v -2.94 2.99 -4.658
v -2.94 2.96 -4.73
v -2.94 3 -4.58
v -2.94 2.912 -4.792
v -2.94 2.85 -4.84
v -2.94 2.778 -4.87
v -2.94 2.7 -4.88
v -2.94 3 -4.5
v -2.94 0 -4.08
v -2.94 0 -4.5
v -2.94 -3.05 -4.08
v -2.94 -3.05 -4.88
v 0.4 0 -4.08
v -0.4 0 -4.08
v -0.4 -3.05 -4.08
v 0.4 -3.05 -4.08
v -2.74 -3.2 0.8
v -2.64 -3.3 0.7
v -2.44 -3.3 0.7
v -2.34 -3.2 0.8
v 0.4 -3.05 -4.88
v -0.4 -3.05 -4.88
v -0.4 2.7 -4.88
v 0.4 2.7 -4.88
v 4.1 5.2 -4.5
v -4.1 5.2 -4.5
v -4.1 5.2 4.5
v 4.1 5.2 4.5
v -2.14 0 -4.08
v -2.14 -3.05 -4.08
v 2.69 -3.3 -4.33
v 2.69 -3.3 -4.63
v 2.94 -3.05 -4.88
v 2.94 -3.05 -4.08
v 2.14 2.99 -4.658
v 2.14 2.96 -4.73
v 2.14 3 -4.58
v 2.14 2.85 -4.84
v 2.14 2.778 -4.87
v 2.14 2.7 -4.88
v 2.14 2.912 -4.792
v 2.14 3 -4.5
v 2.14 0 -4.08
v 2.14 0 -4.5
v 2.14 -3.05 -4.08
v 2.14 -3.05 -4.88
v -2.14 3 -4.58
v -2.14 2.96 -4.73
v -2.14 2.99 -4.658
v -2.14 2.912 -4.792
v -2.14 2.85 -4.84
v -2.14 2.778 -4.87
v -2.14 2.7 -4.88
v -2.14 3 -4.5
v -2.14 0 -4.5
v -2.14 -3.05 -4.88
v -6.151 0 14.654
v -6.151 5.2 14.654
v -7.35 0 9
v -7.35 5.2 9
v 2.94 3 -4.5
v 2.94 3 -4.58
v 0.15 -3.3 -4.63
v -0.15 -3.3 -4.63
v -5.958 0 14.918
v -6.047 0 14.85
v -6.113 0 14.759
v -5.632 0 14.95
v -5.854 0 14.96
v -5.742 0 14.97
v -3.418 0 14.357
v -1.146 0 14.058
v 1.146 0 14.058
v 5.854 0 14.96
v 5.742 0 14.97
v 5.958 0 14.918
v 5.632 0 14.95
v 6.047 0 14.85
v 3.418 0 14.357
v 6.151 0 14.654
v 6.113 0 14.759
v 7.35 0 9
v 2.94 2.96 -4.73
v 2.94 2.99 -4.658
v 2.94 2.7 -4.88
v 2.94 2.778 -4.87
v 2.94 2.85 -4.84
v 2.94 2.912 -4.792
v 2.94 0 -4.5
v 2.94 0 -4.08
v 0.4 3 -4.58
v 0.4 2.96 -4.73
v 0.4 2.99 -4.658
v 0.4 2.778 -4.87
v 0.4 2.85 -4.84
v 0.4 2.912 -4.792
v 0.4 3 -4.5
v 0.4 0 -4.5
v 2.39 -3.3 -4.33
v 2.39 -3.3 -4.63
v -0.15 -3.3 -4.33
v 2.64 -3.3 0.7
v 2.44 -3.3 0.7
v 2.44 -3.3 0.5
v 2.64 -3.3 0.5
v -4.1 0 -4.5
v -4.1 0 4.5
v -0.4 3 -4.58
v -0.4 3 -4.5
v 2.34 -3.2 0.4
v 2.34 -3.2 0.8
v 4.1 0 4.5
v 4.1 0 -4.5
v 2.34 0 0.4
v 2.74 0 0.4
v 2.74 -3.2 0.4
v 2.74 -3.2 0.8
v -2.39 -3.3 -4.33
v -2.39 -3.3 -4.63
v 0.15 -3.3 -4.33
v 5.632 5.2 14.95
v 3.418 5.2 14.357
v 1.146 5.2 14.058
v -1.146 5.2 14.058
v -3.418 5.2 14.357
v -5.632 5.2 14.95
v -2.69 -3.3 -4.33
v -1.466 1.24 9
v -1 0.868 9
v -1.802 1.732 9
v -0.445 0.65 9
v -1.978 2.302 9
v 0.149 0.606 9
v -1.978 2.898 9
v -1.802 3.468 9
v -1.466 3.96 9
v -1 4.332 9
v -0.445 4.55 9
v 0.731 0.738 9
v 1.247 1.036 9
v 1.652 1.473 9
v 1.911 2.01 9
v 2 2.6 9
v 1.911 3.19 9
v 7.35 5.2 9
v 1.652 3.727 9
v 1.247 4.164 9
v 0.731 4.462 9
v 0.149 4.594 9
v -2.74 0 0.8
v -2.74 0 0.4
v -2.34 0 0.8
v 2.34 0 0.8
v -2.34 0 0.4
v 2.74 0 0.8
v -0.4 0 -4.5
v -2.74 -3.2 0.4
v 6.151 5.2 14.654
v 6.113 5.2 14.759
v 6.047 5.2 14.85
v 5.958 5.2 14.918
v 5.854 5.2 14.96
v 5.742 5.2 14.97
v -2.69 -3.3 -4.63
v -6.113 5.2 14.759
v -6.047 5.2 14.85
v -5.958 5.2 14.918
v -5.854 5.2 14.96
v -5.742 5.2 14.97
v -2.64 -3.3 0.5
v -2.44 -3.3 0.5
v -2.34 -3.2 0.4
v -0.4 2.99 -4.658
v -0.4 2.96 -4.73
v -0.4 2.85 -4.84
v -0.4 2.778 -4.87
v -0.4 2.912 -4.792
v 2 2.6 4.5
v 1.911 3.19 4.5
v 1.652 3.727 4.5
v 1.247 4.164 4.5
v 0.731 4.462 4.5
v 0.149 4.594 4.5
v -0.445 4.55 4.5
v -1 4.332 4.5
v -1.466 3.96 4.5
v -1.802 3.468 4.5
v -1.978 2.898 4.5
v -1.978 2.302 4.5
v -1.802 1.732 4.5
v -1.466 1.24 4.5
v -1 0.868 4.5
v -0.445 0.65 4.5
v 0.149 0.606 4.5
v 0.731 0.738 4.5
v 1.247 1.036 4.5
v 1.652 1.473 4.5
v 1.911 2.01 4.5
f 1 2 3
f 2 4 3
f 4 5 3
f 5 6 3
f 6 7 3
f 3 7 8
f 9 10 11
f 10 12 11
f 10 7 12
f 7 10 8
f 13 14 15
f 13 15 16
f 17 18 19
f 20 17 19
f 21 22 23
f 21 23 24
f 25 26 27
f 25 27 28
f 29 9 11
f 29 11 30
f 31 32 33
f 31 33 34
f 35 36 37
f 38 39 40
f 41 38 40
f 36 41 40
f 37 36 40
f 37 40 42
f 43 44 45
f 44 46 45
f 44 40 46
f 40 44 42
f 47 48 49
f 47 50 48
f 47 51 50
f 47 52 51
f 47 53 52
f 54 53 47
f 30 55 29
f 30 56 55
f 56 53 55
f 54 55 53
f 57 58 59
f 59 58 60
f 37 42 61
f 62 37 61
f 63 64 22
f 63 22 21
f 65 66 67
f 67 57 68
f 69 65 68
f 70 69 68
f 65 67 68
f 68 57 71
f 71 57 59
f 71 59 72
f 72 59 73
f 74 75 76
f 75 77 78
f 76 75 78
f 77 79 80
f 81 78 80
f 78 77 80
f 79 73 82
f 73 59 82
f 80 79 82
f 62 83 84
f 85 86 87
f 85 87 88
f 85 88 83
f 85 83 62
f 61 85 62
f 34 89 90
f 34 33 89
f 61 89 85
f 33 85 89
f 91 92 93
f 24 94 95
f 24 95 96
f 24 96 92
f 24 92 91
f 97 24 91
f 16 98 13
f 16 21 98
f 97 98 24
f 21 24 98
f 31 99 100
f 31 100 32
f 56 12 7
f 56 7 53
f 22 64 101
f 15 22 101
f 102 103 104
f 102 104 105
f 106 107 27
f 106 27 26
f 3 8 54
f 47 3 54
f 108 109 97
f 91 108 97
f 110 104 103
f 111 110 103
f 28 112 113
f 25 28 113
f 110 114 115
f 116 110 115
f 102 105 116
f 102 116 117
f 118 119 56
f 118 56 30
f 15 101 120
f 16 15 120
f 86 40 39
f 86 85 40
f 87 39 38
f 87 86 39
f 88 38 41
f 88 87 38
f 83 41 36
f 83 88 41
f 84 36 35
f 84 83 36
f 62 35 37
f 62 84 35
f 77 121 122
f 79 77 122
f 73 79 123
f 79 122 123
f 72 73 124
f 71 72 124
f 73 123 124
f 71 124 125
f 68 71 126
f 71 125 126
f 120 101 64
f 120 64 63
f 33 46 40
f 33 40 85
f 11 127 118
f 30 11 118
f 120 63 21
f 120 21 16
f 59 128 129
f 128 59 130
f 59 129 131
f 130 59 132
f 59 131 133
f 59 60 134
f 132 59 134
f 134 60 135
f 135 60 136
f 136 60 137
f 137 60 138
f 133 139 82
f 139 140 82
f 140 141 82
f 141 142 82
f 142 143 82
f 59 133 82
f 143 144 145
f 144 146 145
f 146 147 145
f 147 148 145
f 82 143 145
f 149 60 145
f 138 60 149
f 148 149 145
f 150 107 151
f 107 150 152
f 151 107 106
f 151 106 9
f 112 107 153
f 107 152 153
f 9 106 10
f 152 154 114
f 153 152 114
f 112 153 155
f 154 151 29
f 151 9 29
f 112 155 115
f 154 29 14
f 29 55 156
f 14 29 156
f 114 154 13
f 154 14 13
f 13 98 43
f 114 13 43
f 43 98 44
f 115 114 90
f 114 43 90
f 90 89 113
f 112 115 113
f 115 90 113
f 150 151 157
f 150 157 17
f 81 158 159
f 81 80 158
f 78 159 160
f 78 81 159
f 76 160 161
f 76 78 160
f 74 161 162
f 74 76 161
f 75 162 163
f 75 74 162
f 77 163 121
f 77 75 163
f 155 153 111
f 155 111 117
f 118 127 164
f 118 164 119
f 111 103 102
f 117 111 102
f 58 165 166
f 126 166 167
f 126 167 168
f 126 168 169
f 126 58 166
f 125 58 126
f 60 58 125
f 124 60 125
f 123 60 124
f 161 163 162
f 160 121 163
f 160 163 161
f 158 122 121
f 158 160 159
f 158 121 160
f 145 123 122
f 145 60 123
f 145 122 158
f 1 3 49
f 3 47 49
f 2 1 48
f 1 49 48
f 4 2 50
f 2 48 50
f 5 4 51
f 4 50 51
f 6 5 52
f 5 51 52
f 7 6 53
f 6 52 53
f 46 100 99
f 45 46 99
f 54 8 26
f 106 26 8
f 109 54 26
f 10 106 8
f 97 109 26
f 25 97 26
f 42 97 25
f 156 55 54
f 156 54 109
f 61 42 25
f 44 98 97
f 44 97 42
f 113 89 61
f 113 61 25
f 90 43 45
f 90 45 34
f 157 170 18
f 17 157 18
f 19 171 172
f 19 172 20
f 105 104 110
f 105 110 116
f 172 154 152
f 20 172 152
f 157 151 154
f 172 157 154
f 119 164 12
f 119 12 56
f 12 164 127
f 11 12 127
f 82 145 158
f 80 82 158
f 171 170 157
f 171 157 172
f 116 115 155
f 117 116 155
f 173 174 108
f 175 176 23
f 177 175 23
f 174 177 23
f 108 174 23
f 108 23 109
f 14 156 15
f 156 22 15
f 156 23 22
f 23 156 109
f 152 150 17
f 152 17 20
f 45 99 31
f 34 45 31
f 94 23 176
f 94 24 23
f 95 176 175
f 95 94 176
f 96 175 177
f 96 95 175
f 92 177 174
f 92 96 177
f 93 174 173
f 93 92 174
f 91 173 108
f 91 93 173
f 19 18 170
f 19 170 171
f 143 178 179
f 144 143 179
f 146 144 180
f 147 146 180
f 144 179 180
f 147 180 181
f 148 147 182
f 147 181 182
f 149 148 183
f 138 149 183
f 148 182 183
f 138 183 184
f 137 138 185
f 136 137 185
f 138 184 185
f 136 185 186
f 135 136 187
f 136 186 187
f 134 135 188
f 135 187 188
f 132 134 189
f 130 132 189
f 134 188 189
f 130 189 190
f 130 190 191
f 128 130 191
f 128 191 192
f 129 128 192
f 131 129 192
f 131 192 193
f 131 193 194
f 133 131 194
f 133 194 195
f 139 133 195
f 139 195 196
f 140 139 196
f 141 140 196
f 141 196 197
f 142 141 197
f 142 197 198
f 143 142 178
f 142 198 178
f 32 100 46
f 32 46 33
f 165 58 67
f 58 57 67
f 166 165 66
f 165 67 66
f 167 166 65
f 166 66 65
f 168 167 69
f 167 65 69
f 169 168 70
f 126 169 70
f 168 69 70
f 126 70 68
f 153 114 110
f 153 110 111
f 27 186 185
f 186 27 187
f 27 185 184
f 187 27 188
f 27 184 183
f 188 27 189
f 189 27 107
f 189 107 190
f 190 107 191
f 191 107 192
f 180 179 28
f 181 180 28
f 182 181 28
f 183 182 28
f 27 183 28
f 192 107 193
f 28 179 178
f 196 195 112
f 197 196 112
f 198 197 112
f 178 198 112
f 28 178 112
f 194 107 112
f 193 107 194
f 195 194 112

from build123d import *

# Parameters (mm, degrees)
SKETCH1_W           = 8.2
SKETCH1_H           = 9
BOSS_EXTRUDE1_DEPTH = 5.2
SKETCH2_W           = 0.4
SKETCH2_H           = 0.4
SKETCH2_W_2         = 0.8
SKETCH2_H_2         = 0.8
BOSS_EXTRUDE2_DEPTH = 3.3
CHAMFER1_SIZE       = 0.1
CHAMFER2_SIZE       = 0.25
SKETCH2_2_W         = 0.8
SKETCH2_2_H         = 0.38
BOSS_EXTRUDE3_DEPTH = 3
FILLET1_R           = 0.3
SKETCH3_R           = 2
BOSS_EXTRUDE4_DEPTH = 4.5
SKETCH4_W           = 14.7
SKETCH4_H           = 5.2
BOSS_EXTRUDE5_DEPTH = 6.1
CUT_EXTRUDE1_DEPTH  = 19.822393578
FILLET2_R           = 0.4


with BuildPart() as part:
    # Sketch1 → Boss-Extrude1 (new body)
    with BuildSketch(Plane(origin=(0, 0, 0), x_dir=(1, 0, 0), z_dir=(0, 1, 0))):
        Rectangle(SKETCH1_W, SKETCH1_H)
    extrude(amount=BOSS_EXTRUDE1_DEPTH)

    # Sketch2 → Boss-Extrude2 (add)
    with BuildSketch(Plane.XZ):
        with Locations((-2.54, 0.6)):
            Rectangle(SKETCH2_W, SKETCH2_H)
        with Locations((2.54, 0.6)):
            Rectangle(SKETCH2_W, SKETCH2_H)
        with Locations((-2.54, -4.48)):
            Rectangle(SKETCH2_W_2, SKETCH2_H_2)
        with Locations((0, -4.48)):
            Rectangle(SKETCH2_W_2, SKETCH2_H_2)
        with Locations((2.54, -4.48)):
            Rectangle(SKETCH2_W_2, SKETCH2_H_2)
    extrude(amount=BOSS_EXTRUDE2_DEPTH)

    # Chamfer1
    chamfer1_edges = [part.edges().sort_by_distance(p)[0] for p in [
        (-2.34, -3.3, 0.6),
        (-2.54, -3.3, 0.8),
        (-2.74, -3.3, 0.6),
        (-2.54, -3.3, 0.4),
        (2.74, -3.3, 0.6),
        (2.54, -3.3, 0.8),
        (2.34, -3.3, 0.6),
        (2.54, -3.3, 0.4),
    ]]
    chamfer(chamfer1_edges, length=CHAMFER1_SIZE)

    # Chamfer2
    chamfer2_edges = [part.edges().sort_by_distance(p)[0] for p in [
        (-2.14, -3.3, -4.48),
        (-2.54, -3.3, -4.08),
        (-2.94, -3.3, -4.48),
        (-2.54, -3.3, -4.88),
        (0.4, -3.3, -4.48),
        (0, -3.3, -4.08),
        (-0.4, -3.3, -4.48),
        (0, -3.3, -4.88),
        (2.94, -3.3, -4.48),
        (2.54, -3.3, -4.08),
        (2.14, -3.3, -4.48),
        (2.54, -3.3, -4.88),
    ]]
    chamfer(chamfer2_edges, length=CHAMFER2_SIZE)

    # Sketch2<2> → Boss-Extrude3 (add)
    with BuildSketch(Plane.XZ):
        with Locations((-2.54, -4.69)):
            Rectangle(SKETCH2_2_W, SKETCH2_2_H)
        with Locations((0, -4.69)):
            Rectangle(SKETCH2_2_W, SKETCH2_2_H)
        with Locations((2.54, -4.69)):
            Rectangle(SKETCH2_2_W, SKETCH2_2_H)
    extrude(amount=-BOSS_EXTRUDE3_DEPTH)

    # Fillet1
    fillet1_edges = [part.edges().sort_by_distance(p)[0] for p in [
        (-2.54, 3, -4.88),
        (0, 3, -4.88),
        (2.54, 3, -4.88),
    ]]
    fillet(fillet1_edges, radius=FILLET1_R)

    # Sketch3 → Boss-Extrude4 (add)
    with BuildSketch(Plane.XY.offset(4.5)):
        with Locations((0, 2.6)):
            Circle(SKETCH3_R)
    extrude(amount=BOSS_EXTRUDE4_DEPTH)

    # Sketch4 → Boss-Extrude5 (add)
    with BuildSketch(Plane.XY.offset(9)):
        with Locations((0, 2.6)):
            Rectangle(SKETCH4_W, SKETCH4_H)
    extrude(amount=BOSS_EXTRUDE5_DEPTH)

    # Sketch5 → Cut-Extrude1 (cut, through all)
    with BuildSketch(Plane(origin=(0, 5.2, 0), x_dir=(1, 0, 0), z_dir=(0, 1, 0))):
        Polygon((-6.056784937, -15.1), (-7.35, -9), (-7.35, -15.1), align=None)
        with BuildLine():
            ThreePointArc((6.056784937, -15.1), (0, -14.020611804), (-6.056784937, -15.1))
            Line((-6.056784937, -15.1), (6.056784937, -15.1))
        make_face()
        Polygon((7.35, -9), (6.056784937, -15.1), (7.35, -15.1), align=None)
    extrude(amount=-CUT_EXTRUDE1_DEPTH, mode=Mode.SUBTRACT)

    # Fillet2
    fillet2_edges = [part.edges().sort_by_distance(p)[0] for p in [
        (6.056784937, 2.6, 15.1),
        (-6.056784937, 2.6, 15.1),
    ]]
    fillet(fillet2_edges, radius=FILLET2_R)


solid = part.part
